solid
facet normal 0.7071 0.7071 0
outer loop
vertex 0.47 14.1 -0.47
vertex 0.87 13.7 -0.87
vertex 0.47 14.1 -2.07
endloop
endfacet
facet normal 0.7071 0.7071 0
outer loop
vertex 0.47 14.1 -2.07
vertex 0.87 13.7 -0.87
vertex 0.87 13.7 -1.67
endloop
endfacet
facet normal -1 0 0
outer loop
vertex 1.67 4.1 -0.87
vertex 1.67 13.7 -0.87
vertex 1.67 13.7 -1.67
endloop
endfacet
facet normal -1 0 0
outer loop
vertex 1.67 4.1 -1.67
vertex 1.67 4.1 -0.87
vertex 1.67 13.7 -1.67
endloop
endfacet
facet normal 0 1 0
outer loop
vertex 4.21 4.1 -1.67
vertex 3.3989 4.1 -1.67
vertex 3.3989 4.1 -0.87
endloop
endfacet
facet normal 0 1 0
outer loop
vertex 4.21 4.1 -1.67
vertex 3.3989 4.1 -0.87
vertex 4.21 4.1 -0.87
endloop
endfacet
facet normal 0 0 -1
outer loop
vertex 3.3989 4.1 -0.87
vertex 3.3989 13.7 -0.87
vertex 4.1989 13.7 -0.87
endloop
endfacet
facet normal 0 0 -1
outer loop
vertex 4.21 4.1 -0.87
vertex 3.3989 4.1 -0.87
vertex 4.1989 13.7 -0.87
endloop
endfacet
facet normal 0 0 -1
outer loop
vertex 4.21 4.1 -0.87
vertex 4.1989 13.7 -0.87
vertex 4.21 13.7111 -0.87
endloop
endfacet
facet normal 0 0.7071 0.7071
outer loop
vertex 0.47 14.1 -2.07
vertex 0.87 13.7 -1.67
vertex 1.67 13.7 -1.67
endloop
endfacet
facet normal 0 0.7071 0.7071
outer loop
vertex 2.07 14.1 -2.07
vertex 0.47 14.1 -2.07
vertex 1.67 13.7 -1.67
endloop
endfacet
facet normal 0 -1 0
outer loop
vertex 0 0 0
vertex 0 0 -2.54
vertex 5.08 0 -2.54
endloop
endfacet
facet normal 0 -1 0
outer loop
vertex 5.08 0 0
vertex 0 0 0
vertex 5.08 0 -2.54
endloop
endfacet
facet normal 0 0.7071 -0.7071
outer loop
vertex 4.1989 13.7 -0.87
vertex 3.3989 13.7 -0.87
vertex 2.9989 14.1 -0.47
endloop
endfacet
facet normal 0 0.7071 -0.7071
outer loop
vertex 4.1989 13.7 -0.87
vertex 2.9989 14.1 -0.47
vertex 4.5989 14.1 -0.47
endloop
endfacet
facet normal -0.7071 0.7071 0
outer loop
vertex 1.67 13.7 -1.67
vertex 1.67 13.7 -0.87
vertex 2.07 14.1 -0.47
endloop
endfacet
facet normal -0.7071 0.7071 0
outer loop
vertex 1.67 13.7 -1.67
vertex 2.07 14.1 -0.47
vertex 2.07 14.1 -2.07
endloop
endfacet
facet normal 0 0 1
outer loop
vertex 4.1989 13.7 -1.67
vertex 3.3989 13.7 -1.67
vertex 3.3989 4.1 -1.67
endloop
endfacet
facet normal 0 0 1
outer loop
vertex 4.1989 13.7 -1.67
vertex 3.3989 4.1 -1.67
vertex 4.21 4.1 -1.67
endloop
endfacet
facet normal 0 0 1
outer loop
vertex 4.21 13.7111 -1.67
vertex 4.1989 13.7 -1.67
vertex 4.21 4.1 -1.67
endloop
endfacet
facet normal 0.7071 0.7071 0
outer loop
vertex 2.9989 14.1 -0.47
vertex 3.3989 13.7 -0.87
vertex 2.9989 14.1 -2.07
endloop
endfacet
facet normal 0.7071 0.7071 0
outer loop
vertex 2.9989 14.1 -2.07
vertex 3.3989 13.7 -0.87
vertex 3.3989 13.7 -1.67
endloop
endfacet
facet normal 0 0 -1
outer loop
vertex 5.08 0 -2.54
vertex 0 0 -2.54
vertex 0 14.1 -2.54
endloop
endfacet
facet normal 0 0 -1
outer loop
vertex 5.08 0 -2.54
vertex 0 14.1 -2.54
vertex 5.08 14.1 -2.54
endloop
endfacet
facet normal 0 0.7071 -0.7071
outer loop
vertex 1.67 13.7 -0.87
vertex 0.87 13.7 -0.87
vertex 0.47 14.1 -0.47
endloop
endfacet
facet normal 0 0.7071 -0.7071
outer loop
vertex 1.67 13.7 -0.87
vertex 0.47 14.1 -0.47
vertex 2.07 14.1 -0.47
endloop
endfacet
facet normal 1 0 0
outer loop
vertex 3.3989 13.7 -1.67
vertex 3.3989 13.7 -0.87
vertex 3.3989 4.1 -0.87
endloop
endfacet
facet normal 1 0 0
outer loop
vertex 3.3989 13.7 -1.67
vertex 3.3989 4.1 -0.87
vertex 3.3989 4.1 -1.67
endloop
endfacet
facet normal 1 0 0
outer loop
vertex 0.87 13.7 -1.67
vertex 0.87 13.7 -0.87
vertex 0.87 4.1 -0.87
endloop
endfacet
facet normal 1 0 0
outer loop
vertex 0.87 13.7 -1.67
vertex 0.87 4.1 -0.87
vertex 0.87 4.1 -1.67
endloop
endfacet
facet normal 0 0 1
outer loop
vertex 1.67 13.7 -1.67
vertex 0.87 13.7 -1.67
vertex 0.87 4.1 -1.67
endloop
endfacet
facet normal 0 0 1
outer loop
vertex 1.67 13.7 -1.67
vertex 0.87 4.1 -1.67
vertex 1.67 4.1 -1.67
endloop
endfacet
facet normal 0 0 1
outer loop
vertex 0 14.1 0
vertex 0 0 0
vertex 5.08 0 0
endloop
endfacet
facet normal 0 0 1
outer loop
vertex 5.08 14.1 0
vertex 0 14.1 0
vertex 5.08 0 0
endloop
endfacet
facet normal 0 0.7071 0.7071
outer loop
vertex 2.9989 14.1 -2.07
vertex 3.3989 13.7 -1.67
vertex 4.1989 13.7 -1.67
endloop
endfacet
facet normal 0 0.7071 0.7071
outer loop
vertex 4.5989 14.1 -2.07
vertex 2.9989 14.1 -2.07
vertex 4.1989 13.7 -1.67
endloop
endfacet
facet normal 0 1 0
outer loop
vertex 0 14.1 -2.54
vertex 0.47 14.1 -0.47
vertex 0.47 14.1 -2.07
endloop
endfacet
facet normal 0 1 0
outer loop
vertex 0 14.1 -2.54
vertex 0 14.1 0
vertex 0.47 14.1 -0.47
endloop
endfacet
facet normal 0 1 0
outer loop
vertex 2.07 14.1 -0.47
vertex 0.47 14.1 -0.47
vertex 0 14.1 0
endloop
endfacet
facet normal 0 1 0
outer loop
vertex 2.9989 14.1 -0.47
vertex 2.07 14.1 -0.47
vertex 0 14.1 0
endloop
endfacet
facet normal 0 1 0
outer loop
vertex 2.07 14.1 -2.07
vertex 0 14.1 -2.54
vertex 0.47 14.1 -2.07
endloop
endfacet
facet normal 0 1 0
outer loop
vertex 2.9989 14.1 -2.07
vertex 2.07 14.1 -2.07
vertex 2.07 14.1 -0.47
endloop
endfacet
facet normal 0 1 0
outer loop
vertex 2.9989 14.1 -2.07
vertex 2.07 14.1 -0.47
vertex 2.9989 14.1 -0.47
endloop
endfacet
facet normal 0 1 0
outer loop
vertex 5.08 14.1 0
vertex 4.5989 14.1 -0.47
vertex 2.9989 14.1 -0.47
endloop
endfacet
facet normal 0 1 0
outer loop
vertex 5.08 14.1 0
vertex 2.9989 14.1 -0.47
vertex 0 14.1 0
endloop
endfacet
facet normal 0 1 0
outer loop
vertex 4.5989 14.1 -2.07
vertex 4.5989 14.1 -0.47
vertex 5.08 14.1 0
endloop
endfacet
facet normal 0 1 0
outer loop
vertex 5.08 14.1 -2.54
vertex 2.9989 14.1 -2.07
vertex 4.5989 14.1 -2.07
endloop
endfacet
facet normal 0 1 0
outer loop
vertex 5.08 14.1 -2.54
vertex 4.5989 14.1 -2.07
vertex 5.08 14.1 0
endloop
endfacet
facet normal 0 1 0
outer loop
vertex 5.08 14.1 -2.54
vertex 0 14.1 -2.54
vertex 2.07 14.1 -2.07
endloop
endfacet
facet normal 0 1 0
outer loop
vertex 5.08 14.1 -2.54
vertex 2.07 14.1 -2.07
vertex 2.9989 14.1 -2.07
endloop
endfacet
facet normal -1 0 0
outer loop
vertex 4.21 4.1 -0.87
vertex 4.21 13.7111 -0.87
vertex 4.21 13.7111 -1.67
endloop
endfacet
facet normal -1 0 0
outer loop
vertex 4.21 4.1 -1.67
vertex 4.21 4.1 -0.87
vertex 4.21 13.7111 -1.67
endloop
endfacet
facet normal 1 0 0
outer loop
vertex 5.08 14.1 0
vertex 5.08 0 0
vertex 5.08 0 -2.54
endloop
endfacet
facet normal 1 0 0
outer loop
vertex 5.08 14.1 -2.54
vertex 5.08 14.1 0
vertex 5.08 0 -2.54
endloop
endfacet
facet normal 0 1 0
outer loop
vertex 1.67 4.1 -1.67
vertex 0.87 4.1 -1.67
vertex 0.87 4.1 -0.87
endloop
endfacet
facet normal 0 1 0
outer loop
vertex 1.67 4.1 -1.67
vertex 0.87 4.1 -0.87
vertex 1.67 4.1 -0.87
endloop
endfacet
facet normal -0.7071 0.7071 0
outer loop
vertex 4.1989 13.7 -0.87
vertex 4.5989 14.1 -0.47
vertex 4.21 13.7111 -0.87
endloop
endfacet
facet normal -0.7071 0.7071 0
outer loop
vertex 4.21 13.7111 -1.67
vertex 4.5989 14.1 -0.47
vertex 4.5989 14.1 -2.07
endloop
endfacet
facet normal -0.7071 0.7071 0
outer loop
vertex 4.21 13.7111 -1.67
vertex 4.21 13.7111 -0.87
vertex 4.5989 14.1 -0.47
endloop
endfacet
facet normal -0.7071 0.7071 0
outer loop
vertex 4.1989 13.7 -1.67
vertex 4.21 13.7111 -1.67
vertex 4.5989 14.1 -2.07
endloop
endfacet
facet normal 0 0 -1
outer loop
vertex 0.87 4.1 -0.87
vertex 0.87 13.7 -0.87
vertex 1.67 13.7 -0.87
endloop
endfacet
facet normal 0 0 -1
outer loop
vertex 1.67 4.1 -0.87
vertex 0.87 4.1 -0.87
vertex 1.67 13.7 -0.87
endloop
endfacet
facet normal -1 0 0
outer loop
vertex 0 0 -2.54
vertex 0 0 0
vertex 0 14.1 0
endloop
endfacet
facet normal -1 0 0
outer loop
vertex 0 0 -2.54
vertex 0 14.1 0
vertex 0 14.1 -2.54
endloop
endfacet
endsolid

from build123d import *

# Parameters (mm, degrees)
SKETCH_1_W          = 5.08
SKETCH_1_H          = 2.54
EXTRUDE_1_DEPTH     = 14.1
SKETCH_5_W          = 0.8
SKETCH_5_H          = 0.8
CUT_EXTRUDE_5_DEPTH = 10
CHAMFER_5_SIZE      = 0.4
SKETCH_2_W          = 0.8
SKETCH_2_H          = 0.8
CUT_EXTRUDE_2_DEPTH = 10


with BuildPart() as part:
    # Эскиз1 → Бобышка-Вытянуть1 (new body)
    with BuildSketch(Plane(origin=(0, 0, 0), x_dir=(1, 0, 0), z_dir=(0, 1, 0))):
        with Locations((2.54, 1.27)):
            Rectangle(SKETCH_1_W, SKETCH_1_H)
    extrude(amount=EXTRUDE_1_DEPTH)

    # Эскиз5 → Вырез-Вытянуть5 (cut)
    with BuildSketch(Plane(origin=(0, 14.1, 0), x_dir=(1, 0, 0), z_dir=(0, 1, 0))):
        with Locations((1.27, 1.27)):
            Rectangle(SKETCH_5_W, SKETCH_5_H)
        with Locations((3.79891982, 1.27)):
            Rectangle(SKETCH_5_W, SKETCH_5_H)
    extrude(amount=-CUT_EXTRUDE_5_DEPTH, mode=Mode.SUBTRACT)

    # Фаска5
    chamfer_5_edges = [part.edges().sort_by_distance(p)[0] for p in [
        (0.87, 14.1, -1.27),
        (1.27, 14.1, -1.67),
        (1.27, 14.1, -0.87),
        (1.67, 14.1, -1.27),
        (3.39891982, 14.1, -1.27),
        (3.79891982, 14.1, -1.67),
        (3.79891982, 14.1, -0.87),
        (4.19891982, 14.1, -1.27),
    ]]
    chamfer(chamfer_5_edges, length=CHAMFER_5_SIZE)

    # Эскиз2 → Вырез-Вытянуть2 (cut)
    with BuildSketch(Plane(origin=(0, 14.1, 0), x_dir=(1, 0, 0), z_dir=(0, 1, 0))):
        with Locations((1.27, 1.27)):
            Rectangle(SKETCH_2_W, SKETCH_2_H)
        with Locations((3.81, 1.27)):
            Rectangle(SKETCH_2_W, SKETCH_2_H)
    extrude(amount=-CUT_EXTRUDE_2_DEPTH, mode=Mode.SUBTRACT)


solid = part.part
